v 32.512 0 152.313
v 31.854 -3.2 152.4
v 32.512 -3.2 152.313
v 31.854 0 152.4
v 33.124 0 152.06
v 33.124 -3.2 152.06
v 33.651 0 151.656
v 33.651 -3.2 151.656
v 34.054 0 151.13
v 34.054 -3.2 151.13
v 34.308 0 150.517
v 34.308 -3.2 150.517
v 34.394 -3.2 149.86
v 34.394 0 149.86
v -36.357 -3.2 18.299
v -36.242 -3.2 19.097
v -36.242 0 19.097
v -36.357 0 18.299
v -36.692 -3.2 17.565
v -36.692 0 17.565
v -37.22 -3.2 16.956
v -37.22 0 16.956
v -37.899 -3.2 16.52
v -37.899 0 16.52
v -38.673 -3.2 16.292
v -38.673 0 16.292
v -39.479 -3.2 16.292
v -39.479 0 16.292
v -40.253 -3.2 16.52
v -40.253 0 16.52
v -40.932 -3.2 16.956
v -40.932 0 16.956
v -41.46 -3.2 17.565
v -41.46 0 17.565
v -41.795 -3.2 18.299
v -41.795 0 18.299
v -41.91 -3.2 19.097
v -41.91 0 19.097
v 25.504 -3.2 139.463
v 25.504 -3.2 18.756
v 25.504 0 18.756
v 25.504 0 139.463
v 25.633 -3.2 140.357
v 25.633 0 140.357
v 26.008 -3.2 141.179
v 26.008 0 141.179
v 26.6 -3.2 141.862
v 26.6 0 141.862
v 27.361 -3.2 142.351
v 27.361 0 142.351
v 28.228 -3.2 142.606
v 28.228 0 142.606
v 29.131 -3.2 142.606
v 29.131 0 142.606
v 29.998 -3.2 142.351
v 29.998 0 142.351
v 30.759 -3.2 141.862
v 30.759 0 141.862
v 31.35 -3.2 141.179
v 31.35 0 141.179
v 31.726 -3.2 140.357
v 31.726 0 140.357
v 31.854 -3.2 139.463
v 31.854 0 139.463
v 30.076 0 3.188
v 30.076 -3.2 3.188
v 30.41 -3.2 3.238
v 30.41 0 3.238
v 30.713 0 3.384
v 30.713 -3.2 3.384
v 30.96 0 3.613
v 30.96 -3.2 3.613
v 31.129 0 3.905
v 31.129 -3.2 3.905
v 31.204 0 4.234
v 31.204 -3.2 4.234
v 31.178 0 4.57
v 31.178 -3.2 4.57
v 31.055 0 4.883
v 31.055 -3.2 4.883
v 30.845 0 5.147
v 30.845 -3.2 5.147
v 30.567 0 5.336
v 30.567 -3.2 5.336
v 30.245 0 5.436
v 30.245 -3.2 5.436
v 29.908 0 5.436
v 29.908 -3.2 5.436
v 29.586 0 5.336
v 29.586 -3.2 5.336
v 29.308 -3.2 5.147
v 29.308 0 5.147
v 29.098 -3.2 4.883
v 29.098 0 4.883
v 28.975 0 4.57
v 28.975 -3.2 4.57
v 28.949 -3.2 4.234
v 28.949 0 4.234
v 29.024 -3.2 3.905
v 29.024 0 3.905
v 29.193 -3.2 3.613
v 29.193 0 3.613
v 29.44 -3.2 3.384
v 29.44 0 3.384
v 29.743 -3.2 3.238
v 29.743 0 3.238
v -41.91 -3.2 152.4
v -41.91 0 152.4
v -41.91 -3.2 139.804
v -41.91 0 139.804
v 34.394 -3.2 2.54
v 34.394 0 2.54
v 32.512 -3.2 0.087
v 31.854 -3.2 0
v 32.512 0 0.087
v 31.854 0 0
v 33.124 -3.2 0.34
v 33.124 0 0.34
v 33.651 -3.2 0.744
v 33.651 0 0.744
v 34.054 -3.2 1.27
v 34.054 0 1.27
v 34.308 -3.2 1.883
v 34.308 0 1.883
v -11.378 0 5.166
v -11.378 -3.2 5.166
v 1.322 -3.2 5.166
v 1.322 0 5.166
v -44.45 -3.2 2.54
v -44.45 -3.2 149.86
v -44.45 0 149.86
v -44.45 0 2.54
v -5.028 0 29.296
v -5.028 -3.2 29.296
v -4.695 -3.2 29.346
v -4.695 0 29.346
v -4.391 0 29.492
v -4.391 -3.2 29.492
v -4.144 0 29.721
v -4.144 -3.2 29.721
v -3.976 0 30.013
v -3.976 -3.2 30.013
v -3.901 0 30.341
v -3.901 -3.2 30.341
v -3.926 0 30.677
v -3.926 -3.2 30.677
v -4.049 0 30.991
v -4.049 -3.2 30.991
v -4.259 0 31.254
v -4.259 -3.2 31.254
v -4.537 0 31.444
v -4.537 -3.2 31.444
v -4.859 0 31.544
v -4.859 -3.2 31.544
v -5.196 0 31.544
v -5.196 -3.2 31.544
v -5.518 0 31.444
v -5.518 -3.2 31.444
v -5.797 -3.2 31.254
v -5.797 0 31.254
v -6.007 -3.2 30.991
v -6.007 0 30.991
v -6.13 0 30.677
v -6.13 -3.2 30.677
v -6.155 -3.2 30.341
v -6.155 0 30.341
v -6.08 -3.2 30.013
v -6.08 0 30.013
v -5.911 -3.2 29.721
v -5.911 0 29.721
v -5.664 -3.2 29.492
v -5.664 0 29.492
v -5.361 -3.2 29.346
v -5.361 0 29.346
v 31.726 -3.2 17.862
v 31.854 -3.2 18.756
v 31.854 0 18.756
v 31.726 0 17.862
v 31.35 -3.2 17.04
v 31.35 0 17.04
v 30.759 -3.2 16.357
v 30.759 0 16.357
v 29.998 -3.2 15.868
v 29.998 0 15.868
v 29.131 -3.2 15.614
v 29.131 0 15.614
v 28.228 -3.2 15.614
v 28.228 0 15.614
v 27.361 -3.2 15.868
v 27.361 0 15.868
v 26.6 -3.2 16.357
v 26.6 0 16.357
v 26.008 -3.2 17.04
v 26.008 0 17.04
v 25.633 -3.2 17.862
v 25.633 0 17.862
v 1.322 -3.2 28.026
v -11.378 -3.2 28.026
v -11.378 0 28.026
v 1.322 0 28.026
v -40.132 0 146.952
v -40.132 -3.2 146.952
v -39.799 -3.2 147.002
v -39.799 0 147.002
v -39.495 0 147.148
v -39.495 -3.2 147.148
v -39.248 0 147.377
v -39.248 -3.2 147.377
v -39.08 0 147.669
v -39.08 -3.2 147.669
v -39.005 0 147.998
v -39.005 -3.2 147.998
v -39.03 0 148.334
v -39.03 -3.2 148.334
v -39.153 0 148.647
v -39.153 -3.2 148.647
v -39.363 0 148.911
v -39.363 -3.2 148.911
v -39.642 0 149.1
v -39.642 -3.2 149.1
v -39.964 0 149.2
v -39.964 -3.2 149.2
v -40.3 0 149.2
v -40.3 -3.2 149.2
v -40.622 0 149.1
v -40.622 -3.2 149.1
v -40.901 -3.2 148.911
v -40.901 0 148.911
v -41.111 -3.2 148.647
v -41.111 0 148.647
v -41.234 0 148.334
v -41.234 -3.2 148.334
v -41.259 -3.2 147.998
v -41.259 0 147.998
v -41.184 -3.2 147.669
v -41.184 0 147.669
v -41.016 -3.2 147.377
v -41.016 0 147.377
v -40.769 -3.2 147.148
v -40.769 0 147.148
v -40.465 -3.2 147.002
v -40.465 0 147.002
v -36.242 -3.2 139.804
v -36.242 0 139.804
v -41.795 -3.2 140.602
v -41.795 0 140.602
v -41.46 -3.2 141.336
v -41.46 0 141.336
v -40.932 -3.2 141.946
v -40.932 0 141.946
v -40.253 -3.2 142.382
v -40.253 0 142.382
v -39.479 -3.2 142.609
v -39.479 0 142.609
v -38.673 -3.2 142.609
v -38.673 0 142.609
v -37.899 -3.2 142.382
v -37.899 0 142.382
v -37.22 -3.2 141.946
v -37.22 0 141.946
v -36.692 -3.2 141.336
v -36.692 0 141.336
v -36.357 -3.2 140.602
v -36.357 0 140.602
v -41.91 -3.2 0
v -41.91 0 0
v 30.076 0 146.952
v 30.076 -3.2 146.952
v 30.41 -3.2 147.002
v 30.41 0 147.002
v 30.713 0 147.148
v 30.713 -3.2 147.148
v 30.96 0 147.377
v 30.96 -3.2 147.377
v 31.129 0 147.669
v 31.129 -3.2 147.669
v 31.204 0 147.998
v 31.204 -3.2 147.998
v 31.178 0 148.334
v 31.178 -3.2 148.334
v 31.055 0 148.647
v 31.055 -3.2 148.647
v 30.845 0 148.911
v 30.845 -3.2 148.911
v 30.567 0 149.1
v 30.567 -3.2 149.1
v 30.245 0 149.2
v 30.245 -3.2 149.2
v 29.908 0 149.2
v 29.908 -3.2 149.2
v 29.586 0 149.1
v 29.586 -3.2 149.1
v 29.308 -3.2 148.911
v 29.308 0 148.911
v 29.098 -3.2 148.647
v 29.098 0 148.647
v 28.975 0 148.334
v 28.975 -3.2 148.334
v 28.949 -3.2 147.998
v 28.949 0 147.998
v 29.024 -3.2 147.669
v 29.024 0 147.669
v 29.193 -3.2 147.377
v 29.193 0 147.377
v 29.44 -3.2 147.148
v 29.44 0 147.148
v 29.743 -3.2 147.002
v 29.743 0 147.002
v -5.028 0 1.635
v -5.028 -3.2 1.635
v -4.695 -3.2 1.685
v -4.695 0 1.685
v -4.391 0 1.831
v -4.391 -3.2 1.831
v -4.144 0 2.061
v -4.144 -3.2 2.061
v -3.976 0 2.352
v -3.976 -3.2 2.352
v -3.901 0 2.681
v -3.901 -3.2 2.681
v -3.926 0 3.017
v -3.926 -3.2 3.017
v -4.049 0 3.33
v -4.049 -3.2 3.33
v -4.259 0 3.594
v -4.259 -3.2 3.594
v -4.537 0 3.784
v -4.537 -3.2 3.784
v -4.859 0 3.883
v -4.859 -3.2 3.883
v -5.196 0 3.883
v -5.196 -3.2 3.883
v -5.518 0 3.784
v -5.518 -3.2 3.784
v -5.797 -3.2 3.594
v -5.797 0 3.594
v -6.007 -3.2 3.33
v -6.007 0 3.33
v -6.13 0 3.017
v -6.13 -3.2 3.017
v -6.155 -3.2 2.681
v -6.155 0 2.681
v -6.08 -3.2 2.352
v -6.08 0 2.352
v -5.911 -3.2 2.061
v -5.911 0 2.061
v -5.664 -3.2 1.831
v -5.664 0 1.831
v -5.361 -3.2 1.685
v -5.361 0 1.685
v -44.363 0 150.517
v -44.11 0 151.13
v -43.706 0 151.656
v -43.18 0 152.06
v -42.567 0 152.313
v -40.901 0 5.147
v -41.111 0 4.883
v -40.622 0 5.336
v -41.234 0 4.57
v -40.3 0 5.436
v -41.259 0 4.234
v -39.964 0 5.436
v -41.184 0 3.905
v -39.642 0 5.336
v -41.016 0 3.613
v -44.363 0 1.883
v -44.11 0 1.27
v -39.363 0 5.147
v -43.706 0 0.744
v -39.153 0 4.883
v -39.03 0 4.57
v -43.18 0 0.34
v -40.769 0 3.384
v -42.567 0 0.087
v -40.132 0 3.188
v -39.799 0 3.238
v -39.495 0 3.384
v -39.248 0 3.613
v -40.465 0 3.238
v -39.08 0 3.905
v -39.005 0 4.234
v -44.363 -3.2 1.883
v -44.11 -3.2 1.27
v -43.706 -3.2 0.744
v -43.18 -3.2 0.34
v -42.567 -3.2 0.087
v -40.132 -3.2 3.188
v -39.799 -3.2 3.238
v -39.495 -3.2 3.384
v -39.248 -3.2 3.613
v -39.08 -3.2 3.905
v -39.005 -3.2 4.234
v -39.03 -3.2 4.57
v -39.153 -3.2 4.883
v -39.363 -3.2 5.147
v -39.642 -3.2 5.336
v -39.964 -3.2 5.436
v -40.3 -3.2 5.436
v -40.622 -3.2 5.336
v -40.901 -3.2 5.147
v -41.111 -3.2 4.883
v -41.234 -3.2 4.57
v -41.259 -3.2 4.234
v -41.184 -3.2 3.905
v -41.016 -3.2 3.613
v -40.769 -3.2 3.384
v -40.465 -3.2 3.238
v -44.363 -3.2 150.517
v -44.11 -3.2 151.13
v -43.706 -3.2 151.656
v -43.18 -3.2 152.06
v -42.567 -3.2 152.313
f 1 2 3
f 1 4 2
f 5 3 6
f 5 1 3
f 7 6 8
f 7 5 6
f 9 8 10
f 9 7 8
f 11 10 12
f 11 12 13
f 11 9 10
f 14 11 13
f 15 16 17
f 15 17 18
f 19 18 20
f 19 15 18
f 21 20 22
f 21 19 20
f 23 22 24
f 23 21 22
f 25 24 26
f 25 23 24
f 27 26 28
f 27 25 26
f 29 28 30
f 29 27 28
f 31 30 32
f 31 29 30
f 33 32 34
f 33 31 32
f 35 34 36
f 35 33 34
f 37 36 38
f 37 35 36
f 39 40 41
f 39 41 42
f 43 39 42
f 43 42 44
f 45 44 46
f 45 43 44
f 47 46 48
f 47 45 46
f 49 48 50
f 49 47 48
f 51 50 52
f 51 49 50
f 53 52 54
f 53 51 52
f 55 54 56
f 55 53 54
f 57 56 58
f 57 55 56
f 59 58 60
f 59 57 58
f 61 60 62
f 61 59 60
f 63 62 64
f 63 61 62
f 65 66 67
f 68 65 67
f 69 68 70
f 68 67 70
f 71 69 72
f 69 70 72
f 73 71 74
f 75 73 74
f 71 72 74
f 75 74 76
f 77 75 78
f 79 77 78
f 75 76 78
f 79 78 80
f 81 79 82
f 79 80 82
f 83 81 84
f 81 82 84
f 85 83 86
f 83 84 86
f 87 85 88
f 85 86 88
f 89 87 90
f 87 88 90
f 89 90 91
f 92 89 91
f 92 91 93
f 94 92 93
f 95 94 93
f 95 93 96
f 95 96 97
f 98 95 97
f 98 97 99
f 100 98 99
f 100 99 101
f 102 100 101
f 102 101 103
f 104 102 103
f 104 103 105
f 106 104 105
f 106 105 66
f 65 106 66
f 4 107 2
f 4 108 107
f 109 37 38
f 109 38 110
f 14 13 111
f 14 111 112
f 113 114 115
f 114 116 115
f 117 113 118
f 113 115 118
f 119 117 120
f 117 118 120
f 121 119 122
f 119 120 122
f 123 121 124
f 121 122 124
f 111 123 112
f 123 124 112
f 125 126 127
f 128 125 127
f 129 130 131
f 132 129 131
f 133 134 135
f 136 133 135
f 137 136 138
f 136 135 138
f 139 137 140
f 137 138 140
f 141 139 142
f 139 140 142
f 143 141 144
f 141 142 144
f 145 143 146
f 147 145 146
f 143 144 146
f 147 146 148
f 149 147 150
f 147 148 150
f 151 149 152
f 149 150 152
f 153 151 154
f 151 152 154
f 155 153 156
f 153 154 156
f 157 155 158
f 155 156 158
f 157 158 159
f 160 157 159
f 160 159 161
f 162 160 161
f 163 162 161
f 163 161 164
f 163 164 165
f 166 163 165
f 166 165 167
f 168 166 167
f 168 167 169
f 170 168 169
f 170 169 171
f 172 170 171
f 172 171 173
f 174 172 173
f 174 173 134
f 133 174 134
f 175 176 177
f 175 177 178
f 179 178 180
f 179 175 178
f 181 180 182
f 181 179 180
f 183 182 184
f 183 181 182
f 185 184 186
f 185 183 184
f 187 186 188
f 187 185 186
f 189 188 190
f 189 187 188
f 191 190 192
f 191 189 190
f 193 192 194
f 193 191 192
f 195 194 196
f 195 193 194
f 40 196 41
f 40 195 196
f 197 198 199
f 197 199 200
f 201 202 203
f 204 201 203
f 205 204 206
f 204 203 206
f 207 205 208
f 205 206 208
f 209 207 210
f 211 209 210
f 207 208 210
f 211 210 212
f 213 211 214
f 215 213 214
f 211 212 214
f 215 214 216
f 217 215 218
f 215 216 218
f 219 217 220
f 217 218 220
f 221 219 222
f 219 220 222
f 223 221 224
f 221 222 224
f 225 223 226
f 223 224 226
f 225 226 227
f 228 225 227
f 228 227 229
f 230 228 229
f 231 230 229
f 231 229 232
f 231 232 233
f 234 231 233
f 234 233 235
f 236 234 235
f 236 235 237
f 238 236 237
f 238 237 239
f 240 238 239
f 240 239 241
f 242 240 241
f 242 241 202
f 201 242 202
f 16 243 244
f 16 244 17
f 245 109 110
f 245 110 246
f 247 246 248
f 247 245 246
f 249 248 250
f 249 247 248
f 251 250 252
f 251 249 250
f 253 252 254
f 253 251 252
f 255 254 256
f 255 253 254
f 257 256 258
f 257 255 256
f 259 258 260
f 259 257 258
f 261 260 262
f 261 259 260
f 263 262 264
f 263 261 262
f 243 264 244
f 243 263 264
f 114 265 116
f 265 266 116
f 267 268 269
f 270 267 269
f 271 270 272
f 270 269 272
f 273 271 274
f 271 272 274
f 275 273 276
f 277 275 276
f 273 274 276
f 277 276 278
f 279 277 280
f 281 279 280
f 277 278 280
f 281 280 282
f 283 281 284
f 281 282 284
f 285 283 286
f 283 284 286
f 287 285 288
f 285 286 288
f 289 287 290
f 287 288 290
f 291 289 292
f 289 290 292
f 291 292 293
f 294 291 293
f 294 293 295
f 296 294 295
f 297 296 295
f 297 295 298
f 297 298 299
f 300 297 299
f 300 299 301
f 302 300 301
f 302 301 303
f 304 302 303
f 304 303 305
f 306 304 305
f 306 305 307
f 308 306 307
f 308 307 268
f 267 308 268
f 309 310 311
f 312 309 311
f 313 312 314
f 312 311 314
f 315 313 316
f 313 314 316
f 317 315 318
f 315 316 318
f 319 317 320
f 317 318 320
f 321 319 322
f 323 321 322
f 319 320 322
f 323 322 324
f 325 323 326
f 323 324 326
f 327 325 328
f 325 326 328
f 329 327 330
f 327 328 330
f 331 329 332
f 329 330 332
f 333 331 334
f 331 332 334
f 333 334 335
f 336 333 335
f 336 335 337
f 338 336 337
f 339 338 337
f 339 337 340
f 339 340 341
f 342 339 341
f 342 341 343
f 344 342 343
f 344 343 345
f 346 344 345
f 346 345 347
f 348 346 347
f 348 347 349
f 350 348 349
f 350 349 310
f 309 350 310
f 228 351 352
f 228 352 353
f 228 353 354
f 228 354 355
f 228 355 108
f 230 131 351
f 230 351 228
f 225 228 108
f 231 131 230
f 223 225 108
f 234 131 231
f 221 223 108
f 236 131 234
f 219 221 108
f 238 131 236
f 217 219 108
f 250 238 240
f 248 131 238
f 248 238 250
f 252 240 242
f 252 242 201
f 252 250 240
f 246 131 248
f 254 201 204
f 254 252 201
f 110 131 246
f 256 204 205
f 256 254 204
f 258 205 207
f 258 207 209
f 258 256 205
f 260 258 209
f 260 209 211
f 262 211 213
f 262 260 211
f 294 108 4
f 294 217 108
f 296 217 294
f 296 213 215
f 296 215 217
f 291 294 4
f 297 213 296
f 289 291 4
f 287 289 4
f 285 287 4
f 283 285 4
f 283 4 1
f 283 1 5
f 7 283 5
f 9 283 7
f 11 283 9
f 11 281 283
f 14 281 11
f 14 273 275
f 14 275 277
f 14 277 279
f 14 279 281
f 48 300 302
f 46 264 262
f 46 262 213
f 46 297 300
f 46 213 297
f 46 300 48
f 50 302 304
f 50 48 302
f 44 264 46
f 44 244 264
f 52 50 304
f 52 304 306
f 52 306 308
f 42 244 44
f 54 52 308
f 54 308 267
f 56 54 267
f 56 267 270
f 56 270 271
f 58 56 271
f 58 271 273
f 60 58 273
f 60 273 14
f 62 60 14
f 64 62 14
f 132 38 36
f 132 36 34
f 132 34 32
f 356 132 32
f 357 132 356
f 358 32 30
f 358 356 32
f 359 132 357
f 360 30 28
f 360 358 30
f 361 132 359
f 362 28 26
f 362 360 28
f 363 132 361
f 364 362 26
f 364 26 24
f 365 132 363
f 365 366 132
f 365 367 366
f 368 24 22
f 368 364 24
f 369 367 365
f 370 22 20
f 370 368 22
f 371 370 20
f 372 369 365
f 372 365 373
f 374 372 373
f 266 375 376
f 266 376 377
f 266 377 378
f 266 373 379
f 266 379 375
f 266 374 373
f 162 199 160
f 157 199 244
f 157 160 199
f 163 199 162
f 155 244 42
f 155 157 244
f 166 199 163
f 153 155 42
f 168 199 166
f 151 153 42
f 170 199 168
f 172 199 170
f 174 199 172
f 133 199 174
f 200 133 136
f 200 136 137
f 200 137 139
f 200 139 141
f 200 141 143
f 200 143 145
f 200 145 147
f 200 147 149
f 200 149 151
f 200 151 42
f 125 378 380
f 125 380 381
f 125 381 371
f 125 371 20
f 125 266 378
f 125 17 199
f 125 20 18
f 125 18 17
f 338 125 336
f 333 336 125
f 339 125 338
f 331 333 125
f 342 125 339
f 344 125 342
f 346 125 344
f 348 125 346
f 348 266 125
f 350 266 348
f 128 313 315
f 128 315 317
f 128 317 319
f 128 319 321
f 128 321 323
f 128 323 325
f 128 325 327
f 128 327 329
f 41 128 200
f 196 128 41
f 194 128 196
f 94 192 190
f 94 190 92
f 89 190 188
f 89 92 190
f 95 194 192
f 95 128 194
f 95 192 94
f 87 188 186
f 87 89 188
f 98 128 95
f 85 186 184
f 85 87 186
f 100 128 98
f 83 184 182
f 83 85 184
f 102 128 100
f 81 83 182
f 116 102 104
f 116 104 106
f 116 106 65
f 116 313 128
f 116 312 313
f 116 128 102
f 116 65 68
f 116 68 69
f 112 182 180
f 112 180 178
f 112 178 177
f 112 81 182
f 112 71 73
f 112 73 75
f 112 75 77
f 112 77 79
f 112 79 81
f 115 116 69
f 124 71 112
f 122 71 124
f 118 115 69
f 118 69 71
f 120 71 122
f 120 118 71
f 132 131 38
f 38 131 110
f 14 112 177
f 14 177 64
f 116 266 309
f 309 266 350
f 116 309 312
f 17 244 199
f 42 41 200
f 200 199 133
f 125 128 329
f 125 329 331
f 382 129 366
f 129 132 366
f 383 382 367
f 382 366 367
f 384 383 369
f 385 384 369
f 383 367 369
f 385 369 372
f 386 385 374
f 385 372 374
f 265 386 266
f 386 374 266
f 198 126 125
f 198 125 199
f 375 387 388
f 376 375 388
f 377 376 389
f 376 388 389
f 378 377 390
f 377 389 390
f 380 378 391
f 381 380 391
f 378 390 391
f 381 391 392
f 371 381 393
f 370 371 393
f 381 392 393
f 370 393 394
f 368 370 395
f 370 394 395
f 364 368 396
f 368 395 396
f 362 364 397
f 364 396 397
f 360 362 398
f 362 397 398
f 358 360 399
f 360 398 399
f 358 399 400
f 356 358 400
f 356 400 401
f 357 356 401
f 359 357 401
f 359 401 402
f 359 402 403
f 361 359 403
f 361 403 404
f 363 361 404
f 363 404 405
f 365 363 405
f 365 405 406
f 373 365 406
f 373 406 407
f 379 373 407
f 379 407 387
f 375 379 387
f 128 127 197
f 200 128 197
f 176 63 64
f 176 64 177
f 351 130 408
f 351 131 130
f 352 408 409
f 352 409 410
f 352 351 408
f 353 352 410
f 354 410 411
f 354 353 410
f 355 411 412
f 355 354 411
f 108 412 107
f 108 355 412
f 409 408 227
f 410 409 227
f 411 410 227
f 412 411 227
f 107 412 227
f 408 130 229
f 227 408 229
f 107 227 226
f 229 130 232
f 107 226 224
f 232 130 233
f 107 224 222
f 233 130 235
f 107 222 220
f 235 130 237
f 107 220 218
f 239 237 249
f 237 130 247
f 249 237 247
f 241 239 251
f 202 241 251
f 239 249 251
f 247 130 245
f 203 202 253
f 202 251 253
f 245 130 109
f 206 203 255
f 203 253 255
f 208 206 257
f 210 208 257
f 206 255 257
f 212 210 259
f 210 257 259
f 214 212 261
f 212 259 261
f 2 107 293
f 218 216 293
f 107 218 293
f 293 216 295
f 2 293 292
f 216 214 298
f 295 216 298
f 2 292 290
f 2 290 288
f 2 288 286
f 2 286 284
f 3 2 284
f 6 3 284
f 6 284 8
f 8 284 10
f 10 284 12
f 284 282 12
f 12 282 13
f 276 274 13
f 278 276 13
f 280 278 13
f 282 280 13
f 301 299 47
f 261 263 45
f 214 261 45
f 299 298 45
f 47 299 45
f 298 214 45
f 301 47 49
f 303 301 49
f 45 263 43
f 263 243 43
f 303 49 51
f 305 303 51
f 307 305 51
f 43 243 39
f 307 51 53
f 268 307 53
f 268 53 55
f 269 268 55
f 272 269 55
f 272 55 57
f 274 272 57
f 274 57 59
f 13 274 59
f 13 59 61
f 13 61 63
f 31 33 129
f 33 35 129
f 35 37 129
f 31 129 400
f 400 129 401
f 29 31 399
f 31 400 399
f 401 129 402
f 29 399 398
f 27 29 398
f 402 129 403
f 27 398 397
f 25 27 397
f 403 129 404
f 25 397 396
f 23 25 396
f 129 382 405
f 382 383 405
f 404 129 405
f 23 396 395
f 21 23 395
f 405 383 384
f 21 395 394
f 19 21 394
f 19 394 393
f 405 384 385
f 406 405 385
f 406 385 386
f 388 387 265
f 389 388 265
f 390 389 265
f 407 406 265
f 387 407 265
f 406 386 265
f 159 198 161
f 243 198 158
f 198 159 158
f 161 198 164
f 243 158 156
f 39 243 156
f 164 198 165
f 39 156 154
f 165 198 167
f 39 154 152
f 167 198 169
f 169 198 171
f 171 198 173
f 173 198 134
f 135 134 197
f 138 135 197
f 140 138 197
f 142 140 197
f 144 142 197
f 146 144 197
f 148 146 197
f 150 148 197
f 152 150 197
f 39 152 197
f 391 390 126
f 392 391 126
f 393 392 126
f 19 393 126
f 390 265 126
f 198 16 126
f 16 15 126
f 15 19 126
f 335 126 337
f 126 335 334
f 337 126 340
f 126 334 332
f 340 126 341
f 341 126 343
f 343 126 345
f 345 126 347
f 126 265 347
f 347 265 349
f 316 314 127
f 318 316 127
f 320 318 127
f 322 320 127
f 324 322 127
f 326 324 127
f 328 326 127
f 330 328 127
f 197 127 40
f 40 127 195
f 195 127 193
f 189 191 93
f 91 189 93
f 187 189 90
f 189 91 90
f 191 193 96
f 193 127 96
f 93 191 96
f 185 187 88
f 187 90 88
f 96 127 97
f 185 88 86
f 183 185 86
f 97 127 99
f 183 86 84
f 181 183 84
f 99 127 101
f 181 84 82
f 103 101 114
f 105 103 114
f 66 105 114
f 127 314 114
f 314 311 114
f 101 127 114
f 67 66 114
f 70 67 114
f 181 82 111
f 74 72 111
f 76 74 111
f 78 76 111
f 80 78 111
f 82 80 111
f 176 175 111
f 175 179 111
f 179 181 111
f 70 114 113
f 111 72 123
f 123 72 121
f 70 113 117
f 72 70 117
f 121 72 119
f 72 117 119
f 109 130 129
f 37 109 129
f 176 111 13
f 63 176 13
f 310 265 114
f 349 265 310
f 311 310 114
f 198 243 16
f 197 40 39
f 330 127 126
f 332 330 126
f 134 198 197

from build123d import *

# Parameters (mm, degrees)
SKETCH2_W           = 78.8444702
SKETCH2_H           = 3.2004
BOSS_EXTRUDE1_DEPTH = 152.4
SKETCH3_R           = 1.1303
SKETCH3_W           = 12.7
SKETCH3_H           = 22.86
CUT_EXTRUDE1_DEPTH  = 159.782256755
FILLET1_R           = 2.54


with BuildPart() as part:
    # Sketch2 → Boss-Extrude1 (new body)
    with BuildSketch(Plane.XY):
        with Locations((-5.0277649, -1.6002)):
            Rectangle(SKETCH2_W, SKETCH2_H)
    extrude(amount=BOSS_EXTRUDE1_DEPTH)

    # Sketch3 → Cut-Extrude1 (cut, through all)
    with BuildSketch(Plane.XZ.offset(3.2004)):
        with Locations(Location((-40.132, 148.082, 0), (0, 0, 270))):
            Circle(SKETCH3_R)
        with Locations(Location((30.0764702, 148.082, 0), (0, 0, 270))):
            Circle(SKETCH3_R)
        with Locations(Location((-40.132, 4.318, 0), (0, 0, 270))):
            Circle(SKETCH3_R)
        with Locations(Location((30.0764702, 4.318, 0), (0, 0, 270))):
            Circle(SKETCH3_R)
        with Locations(Location((-5.0277649, 30.425887591, 0), (0, 0, 270))):
            Circle(SKETCH3_R)
        with Locations(Location((-5.0277649, 2.765287591, 0), (0, 0, 270))):
            Circle(SKETCH3_R)
        with BuildLine():
            Line((-41.91, 19.097412352), (-41.91, 139.804041398))
            ThreePointArc((-41.91, 139.804041398), (-39.076175505, 142.637865893), (-36.24235101, 139.804041398))
            Line((-36.24235101, 139.804041398), (-36.24235101, 19.097412352))
            ThreePointArc((-36.24235101, 19.097412352), (-39.076175505, 16.263587857), (-41.91, 19.097412352))
        make_face()
        with BuildLine():
            Line((25.5044702, 18.756236847), (25.5044702, 139.462865893))
            ThreePointArc((25.5044702, 139.462865893), (28.6794702, 142.637865893), (31.8544702, 139.462865893))
            Line((31.8544702, 139.462865893), (31.8544702, 18.756236847))
            ThreePointArc((31.8544702, 18.756236847), (28.6794702, 15.581236847), (25.5044702, 18.756236847))
        make_face()
        with Locations((-5.0277649, 16.595587591)):
            Rectangle(SKETCH3_W, SKETCH3_H)
    extrude(amount=-CUT_EXTRUDE1_DEPTH, mode=Mode.SUBTRACT)

    # Fillet1
    fillet1_edges = [part.edges().sort_by_distance(p)[0] for p in [
        (34.3944702, -1.6002, 152.4),
        (-44.45, -1.6002, 152.4),
        (34.3944702, -1.6002, 0),
        (-44.45, -1.6002, 0),
    ]]
    fillet(fillet1_edges, radius=FILLET1_R)


solid = part.part
